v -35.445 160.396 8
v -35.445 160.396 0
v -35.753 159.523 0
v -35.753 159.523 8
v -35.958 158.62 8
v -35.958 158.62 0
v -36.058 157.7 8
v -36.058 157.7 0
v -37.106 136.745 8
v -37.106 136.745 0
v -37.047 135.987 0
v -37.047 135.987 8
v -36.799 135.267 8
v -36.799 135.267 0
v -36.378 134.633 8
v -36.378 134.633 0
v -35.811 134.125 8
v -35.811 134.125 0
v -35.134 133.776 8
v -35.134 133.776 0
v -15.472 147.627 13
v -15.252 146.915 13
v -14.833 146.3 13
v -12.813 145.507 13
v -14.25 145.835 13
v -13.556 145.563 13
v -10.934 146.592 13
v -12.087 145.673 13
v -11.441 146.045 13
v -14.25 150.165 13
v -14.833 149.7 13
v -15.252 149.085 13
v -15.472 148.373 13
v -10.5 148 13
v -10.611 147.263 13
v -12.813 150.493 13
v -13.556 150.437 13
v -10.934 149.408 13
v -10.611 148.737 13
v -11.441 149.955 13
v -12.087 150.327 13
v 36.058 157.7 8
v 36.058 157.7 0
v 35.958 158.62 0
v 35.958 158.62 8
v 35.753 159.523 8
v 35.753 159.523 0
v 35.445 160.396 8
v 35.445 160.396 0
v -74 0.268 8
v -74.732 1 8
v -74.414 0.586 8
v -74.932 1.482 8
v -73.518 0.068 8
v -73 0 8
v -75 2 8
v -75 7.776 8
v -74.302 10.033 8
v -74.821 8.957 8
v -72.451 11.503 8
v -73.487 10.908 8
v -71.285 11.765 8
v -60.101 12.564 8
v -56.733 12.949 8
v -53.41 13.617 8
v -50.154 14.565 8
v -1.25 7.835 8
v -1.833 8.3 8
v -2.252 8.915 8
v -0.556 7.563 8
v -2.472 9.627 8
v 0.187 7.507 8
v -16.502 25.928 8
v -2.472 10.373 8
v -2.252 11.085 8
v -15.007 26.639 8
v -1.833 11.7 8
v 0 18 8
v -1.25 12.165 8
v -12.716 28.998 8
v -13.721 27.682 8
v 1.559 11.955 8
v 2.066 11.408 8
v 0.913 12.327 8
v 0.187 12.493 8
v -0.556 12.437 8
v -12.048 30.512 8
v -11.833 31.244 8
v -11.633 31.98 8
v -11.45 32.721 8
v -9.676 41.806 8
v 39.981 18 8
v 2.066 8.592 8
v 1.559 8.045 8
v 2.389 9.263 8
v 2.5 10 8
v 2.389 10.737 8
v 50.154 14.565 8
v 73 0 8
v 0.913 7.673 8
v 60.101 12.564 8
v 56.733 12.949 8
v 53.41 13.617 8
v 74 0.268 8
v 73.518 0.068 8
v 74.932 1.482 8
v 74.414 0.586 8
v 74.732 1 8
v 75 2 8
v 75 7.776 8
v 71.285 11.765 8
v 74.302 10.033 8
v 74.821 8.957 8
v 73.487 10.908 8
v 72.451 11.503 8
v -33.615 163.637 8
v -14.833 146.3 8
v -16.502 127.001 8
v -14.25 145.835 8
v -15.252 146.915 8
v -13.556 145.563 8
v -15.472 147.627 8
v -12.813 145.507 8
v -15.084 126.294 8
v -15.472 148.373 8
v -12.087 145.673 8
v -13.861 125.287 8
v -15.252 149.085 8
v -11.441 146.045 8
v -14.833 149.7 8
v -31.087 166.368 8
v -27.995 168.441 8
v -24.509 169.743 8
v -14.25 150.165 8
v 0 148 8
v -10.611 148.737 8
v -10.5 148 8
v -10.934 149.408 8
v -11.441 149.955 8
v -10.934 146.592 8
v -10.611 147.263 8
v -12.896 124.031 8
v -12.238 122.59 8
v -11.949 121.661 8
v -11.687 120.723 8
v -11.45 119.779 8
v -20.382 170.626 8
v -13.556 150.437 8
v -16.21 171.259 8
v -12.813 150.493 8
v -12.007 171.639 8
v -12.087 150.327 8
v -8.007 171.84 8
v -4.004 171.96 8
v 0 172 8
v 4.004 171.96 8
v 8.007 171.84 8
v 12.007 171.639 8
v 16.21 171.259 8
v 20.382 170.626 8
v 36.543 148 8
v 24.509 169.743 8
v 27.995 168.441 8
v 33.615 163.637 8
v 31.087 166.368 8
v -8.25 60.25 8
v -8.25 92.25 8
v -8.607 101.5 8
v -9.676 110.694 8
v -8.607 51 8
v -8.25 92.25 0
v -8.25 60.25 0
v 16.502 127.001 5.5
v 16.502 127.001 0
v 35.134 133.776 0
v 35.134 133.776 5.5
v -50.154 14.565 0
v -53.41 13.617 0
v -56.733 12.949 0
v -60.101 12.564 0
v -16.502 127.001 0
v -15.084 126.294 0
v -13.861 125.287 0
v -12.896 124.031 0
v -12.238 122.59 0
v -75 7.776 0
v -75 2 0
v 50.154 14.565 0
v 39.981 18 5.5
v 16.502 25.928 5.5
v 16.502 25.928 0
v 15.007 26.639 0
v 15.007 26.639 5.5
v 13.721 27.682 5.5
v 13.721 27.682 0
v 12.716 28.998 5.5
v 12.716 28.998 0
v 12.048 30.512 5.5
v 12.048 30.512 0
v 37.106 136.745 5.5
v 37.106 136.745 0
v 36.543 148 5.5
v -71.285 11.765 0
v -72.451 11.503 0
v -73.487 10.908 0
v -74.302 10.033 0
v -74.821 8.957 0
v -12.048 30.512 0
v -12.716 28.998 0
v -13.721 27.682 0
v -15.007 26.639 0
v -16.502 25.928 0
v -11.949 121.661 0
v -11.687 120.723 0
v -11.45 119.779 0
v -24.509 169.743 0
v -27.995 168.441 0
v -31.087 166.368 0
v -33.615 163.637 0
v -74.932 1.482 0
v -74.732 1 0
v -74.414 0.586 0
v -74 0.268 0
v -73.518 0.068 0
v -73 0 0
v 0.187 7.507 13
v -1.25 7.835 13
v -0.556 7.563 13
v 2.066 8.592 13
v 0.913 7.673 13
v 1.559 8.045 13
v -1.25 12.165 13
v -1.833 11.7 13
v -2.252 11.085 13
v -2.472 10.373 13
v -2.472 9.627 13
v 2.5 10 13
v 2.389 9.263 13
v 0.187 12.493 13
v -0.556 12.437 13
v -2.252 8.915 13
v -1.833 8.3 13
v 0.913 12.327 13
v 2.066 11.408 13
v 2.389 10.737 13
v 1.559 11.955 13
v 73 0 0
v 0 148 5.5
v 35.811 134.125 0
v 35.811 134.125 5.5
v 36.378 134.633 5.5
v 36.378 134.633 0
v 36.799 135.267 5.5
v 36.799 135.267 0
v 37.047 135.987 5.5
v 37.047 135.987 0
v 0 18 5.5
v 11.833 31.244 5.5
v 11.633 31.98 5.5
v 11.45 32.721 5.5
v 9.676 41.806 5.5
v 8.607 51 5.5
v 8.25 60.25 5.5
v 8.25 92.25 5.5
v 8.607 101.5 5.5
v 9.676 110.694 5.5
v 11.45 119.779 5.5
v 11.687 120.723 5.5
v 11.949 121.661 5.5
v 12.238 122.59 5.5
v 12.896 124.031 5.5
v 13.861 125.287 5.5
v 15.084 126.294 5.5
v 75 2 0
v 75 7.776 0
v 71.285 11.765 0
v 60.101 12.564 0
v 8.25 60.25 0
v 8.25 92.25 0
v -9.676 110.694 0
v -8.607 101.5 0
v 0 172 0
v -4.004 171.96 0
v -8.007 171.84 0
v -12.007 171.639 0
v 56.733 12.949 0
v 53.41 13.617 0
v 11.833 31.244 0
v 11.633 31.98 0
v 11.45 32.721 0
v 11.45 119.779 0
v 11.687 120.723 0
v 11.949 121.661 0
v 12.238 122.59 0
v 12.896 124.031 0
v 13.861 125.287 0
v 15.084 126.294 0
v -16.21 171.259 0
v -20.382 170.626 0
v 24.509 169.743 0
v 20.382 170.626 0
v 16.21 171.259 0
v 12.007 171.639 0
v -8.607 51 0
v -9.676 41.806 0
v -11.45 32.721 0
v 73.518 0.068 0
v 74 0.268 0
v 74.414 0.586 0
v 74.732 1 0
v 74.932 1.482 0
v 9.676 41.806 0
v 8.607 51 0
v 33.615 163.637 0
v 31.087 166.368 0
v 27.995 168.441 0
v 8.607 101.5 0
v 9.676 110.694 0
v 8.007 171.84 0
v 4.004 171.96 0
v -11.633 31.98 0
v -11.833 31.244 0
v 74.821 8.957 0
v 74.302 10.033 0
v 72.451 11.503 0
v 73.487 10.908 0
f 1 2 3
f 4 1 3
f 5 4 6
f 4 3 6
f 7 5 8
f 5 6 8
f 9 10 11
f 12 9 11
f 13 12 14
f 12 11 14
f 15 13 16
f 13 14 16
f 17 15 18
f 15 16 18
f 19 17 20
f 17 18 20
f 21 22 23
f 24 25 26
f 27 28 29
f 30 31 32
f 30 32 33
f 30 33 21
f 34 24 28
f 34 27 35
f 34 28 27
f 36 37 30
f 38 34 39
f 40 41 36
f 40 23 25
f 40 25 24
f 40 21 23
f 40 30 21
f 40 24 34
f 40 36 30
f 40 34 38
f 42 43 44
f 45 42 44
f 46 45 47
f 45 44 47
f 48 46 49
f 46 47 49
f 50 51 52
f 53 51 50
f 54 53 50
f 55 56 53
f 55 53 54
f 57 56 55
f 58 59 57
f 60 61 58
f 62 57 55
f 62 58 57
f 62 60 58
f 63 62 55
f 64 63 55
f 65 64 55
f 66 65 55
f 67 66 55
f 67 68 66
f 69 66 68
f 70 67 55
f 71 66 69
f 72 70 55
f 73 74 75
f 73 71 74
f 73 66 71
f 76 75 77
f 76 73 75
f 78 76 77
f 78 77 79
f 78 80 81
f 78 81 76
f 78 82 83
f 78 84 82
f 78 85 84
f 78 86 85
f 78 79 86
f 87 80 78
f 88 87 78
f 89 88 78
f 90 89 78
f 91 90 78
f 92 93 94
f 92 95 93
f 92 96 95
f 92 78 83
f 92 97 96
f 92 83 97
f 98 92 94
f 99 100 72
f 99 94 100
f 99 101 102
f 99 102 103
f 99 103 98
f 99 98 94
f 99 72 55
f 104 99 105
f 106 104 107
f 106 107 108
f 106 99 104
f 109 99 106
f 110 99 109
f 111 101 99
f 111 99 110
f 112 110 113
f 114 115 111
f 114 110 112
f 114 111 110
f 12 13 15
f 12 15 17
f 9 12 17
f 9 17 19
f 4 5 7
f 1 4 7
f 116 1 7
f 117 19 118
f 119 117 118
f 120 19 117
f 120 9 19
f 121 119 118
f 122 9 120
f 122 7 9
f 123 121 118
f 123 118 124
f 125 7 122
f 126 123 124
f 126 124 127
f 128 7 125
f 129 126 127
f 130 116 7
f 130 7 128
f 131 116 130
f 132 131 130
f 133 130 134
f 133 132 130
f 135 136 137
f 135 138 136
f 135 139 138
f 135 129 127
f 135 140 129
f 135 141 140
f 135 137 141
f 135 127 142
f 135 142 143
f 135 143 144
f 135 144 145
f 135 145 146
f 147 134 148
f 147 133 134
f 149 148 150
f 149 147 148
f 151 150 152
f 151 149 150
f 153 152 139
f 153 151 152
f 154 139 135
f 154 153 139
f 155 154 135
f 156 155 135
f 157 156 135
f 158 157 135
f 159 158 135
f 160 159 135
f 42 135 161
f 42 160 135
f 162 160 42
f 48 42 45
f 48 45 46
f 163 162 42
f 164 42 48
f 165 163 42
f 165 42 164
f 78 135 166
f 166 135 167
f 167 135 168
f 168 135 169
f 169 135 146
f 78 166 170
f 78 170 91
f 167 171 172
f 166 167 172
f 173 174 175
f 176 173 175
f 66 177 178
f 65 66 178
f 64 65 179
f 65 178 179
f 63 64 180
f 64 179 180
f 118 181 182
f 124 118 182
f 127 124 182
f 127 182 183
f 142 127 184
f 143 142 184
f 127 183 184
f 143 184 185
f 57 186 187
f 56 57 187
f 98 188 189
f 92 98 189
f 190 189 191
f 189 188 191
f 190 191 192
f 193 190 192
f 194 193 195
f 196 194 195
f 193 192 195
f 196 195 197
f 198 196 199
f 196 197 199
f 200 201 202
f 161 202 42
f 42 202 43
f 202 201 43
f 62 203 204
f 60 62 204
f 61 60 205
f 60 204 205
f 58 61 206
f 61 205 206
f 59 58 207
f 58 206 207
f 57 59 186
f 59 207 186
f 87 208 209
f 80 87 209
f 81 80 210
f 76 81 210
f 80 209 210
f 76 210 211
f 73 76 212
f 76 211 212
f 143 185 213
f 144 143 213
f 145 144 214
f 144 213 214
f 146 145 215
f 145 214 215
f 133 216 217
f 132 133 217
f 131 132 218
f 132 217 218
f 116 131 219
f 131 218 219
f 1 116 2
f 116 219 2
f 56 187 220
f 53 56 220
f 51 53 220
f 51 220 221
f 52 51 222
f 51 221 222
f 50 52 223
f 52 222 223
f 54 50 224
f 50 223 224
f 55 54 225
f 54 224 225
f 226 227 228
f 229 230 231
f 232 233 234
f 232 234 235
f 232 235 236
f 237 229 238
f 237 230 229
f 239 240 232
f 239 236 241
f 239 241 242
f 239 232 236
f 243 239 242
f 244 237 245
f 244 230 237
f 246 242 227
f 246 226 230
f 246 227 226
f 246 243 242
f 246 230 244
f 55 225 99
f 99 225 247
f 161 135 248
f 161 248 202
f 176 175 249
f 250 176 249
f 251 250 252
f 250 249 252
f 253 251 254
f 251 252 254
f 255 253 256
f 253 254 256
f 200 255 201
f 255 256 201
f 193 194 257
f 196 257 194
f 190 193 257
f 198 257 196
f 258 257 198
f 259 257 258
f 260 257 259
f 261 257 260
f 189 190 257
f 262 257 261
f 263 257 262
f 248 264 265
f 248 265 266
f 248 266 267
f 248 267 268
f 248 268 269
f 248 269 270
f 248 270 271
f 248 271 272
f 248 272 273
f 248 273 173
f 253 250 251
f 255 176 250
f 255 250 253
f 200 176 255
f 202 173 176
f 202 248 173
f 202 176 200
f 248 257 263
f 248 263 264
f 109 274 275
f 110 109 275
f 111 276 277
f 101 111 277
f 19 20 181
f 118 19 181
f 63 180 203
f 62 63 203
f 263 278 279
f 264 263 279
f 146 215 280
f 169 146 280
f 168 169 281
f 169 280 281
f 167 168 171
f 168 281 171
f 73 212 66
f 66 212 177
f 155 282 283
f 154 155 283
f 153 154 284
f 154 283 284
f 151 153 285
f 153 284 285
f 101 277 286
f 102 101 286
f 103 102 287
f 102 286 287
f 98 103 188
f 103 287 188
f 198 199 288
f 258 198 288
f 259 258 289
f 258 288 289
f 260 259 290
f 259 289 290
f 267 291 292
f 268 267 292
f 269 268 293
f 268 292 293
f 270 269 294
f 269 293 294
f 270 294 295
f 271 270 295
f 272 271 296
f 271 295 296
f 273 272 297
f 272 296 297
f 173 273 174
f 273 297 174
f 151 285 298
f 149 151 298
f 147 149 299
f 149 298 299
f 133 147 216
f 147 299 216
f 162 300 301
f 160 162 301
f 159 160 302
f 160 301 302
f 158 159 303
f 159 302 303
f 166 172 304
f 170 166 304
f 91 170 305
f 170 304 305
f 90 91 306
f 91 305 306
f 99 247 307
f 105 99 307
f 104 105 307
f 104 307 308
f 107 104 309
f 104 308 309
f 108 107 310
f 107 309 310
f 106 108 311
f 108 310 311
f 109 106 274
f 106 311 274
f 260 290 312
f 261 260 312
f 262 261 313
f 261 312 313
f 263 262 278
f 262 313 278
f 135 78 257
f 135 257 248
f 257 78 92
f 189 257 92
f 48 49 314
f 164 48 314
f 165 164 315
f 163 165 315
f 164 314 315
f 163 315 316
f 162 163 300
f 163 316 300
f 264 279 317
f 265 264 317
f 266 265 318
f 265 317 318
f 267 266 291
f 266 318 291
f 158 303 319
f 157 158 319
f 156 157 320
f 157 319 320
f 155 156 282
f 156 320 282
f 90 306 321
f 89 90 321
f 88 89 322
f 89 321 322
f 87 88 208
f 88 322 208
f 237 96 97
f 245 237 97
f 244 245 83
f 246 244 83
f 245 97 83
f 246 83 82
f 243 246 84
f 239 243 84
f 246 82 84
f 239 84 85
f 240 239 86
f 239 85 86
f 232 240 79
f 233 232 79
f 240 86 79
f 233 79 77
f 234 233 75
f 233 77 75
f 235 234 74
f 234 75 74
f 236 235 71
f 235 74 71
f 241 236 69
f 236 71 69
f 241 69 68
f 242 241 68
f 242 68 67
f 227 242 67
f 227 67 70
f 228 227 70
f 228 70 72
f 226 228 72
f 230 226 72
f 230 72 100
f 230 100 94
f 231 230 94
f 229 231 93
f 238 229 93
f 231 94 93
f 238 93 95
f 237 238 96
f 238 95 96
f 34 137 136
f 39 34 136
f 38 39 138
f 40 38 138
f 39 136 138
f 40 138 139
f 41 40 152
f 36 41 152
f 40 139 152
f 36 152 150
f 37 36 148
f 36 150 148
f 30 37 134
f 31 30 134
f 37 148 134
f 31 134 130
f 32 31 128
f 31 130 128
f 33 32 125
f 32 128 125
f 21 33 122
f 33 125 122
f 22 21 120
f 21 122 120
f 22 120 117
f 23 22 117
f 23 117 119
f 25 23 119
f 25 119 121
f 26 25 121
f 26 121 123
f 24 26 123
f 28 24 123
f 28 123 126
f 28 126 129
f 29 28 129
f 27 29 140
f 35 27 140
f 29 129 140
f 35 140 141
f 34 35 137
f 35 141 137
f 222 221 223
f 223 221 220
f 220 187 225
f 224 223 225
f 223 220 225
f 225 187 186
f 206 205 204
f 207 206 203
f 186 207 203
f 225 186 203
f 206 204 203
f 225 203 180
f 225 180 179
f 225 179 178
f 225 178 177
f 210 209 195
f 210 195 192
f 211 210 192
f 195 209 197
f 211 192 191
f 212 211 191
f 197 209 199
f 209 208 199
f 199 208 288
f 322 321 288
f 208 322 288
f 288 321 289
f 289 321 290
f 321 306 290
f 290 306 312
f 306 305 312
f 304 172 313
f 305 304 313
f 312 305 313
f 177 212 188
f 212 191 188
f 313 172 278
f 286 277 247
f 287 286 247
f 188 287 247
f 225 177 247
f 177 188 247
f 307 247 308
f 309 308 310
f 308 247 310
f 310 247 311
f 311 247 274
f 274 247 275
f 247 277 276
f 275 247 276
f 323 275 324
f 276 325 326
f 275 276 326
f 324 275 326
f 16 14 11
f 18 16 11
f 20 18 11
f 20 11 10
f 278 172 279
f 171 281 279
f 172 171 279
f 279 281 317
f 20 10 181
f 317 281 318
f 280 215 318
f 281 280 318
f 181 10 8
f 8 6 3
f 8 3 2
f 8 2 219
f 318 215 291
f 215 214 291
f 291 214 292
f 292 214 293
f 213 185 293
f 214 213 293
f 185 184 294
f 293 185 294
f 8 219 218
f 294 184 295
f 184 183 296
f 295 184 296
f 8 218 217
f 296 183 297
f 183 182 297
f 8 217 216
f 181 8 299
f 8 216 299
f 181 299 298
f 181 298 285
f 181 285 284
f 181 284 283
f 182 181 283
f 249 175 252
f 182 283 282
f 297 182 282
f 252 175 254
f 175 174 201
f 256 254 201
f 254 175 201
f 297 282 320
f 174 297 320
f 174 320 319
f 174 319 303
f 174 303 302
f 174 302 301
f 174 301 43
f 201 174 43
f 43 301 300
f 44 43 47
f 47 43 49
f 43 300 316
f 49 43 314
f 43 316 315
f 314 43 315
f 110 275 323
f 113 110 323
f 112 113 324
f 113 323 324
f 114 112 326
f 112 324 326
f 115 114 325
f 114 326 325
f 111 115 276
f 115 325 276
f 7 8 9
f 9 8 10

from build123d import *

# Parameters (mm, degrees)
F1_DEPTH = 8
F2_W     = 118.303065
F2_H     = 130
F3_DEPTH = 2.5
F4_R     = 2.5
F5_DEPTH = 5


with BuildPart() as f1:
    # F0 (on Top) → F1 (new body)
    with BuildSketch(Plane.XY):
        with BuildLine():
            Line((-73, 0), (0, 0))
            Line((0, 0), (73, 0))
            ThreePointArc((73, 0), (74.414214, 0.585786), (75, 2))
            Line((75, 2), (75, 7.775523))
            ThreePointArc((75, 7.775523), (73.927452, 10.50133), (71.284988, 11.765358))
            Line((71.284988, 11.765358), (60.101284, 12.564194))
            ThreePointArc((60.101284, 12.564194), (55.064204, 13.247802), (50.154497, 14.564715))
            Line((50.154497, 14.564715), (16.502155, 25.927844))
            ThreePointArc((16.502155, 25.927844), (13.721064, 27.682003), (12.047716, 30.512454))
            ThreePointArc((12.047716, 30.512454), (11.731046, 31.611641), (11.450465, 32.720588))
            ThreePointArc((11.450465, 32.720588), (9.052802, 46.392588), (8.25, 60.25))
            Line((8.25, 60.25), (8.25, 92.25))
            ThreePointArc((8.25, 92.25), (9.052802, 106.107412), (11.450465, 119.779412))
            ThreePointArc((11.450465, 119.779412), (11.814902, 121.192928), (12.237963, 122.590018))
            ThreePointArc((12.237963, 122.590018), (13.860893, 125.287212), (16.501569, 127.000568))
            Line((16.501569, 127.000568), (35.134496, 133.776176))
            ThreePointArc((35.134496, 133.776176), (36.60869, 134.936374), (37.105525, 136.745369))
            Line((37.105525, 136.745369), (36.057795, 157.7))
            ThreePointArc((36.057795, 157.7), (35.86861, 159.074474), (35.444795, 160.395592))
            ThreePointArc((35.444795, 160.395592), (31.086723, 166.367805), (24.508944, 169.743151))
            ThreePointArc((24.508944, 169.743151), (18.300743, 170.974097), (12.006736, 171.63927))
            ThreePointArc((12.006736, 171.63927), (6.006077, 171.909797), (0, 172))
            ThreePointArc((0, 172), (-6.006077, 171.909797), (-12.006736, 171.63927))
            ThreePointArc((-12.006736, 171.63927), (-18.300743, 170.974097), (-24.508944, 169.743151))
            ThreePointArc((-24.508944, 169.743151), (-31.086723, 166.367805), (-35.444795, 160.395592))
            ThreePointArc((-35.444795, 160.395592), (-35.86861, 159.074474), (-36.057795, 157.7))
            Line((-36.057795, 157.7), (-37.105525, 136.745369))
            ThreePointArc((-37.105525, 136.745369), (-36.60869, 134.936374), (-35.134496, 133.776176))
            Line((-35.134496, 133.776176), (-16.501569, 127.000568))
            ThreePointArc((-16.501569, 127.000568), (-13.860893, 125.287212), (-12.237963, 122.590018))
            ThreePointArc((-12.237963, 122.590018), (-11.814902, 121.192928), (-11.450465, 119.779412))
            ThreePointArc((-11.450465, 119.779412), (-9.052802, 106.107412), (-8.25, 92.25))
            Line((-8.25, 92.25), (-8.25, 60.25))
            ThreePointArc((-8.25, 60.25), (-9.052802, 46.392588), (-11.450465, 32.720588))
            ThreePointArc((-11.450465, 32.720588), (-11.731046, 31.611641), (-12.047716, 30.512454))
            ThreePointArc((-12.047716, 30.512454), (-13.721064, 27.682003), (-16.502155, 25.927844))
            Line((-16.502155, 25.927844), (-50.154497, 14.564715))
            ThreePointArc((-50.154497, 14.564715), (-55.064204, 13.247802), (-60.101284, 12.564194))
            Line((-60.101284, 12.564194), (-71.284988, 11.765358))
            ThreePointArc((-71.284988, 11.765358), (-73.927452, 10.50133), (-75, 7.775523))
            Line((-75, 7.775523), (-75, 2))
            ThreePointArc((-75, 2), (-74.414214, 0.585786), (-73, 0))
        make_face()
    extrude(amount=F1_DEPTH)

    # F2 (on face) → F3 (cut)
    with BuildSketch(Plane.XY.offset(8)):
        with Locations((59.151532, 83)):
            Rectangle(F2_W, F2_H)
    extrude(amount=-F3_DEPTH, mode=Mode.SUBTRACT)

    # F4 (on face) → F5 (join)
    with BuildSketch(Plane.XY.offset(8)):
        with Locations((0, 10)):
            Circle(F4_R)
        with Locations((-13, 148)):
            Circle(F4_R)
    extrude(amount=F5_DEPTH)


solid = f1.part
